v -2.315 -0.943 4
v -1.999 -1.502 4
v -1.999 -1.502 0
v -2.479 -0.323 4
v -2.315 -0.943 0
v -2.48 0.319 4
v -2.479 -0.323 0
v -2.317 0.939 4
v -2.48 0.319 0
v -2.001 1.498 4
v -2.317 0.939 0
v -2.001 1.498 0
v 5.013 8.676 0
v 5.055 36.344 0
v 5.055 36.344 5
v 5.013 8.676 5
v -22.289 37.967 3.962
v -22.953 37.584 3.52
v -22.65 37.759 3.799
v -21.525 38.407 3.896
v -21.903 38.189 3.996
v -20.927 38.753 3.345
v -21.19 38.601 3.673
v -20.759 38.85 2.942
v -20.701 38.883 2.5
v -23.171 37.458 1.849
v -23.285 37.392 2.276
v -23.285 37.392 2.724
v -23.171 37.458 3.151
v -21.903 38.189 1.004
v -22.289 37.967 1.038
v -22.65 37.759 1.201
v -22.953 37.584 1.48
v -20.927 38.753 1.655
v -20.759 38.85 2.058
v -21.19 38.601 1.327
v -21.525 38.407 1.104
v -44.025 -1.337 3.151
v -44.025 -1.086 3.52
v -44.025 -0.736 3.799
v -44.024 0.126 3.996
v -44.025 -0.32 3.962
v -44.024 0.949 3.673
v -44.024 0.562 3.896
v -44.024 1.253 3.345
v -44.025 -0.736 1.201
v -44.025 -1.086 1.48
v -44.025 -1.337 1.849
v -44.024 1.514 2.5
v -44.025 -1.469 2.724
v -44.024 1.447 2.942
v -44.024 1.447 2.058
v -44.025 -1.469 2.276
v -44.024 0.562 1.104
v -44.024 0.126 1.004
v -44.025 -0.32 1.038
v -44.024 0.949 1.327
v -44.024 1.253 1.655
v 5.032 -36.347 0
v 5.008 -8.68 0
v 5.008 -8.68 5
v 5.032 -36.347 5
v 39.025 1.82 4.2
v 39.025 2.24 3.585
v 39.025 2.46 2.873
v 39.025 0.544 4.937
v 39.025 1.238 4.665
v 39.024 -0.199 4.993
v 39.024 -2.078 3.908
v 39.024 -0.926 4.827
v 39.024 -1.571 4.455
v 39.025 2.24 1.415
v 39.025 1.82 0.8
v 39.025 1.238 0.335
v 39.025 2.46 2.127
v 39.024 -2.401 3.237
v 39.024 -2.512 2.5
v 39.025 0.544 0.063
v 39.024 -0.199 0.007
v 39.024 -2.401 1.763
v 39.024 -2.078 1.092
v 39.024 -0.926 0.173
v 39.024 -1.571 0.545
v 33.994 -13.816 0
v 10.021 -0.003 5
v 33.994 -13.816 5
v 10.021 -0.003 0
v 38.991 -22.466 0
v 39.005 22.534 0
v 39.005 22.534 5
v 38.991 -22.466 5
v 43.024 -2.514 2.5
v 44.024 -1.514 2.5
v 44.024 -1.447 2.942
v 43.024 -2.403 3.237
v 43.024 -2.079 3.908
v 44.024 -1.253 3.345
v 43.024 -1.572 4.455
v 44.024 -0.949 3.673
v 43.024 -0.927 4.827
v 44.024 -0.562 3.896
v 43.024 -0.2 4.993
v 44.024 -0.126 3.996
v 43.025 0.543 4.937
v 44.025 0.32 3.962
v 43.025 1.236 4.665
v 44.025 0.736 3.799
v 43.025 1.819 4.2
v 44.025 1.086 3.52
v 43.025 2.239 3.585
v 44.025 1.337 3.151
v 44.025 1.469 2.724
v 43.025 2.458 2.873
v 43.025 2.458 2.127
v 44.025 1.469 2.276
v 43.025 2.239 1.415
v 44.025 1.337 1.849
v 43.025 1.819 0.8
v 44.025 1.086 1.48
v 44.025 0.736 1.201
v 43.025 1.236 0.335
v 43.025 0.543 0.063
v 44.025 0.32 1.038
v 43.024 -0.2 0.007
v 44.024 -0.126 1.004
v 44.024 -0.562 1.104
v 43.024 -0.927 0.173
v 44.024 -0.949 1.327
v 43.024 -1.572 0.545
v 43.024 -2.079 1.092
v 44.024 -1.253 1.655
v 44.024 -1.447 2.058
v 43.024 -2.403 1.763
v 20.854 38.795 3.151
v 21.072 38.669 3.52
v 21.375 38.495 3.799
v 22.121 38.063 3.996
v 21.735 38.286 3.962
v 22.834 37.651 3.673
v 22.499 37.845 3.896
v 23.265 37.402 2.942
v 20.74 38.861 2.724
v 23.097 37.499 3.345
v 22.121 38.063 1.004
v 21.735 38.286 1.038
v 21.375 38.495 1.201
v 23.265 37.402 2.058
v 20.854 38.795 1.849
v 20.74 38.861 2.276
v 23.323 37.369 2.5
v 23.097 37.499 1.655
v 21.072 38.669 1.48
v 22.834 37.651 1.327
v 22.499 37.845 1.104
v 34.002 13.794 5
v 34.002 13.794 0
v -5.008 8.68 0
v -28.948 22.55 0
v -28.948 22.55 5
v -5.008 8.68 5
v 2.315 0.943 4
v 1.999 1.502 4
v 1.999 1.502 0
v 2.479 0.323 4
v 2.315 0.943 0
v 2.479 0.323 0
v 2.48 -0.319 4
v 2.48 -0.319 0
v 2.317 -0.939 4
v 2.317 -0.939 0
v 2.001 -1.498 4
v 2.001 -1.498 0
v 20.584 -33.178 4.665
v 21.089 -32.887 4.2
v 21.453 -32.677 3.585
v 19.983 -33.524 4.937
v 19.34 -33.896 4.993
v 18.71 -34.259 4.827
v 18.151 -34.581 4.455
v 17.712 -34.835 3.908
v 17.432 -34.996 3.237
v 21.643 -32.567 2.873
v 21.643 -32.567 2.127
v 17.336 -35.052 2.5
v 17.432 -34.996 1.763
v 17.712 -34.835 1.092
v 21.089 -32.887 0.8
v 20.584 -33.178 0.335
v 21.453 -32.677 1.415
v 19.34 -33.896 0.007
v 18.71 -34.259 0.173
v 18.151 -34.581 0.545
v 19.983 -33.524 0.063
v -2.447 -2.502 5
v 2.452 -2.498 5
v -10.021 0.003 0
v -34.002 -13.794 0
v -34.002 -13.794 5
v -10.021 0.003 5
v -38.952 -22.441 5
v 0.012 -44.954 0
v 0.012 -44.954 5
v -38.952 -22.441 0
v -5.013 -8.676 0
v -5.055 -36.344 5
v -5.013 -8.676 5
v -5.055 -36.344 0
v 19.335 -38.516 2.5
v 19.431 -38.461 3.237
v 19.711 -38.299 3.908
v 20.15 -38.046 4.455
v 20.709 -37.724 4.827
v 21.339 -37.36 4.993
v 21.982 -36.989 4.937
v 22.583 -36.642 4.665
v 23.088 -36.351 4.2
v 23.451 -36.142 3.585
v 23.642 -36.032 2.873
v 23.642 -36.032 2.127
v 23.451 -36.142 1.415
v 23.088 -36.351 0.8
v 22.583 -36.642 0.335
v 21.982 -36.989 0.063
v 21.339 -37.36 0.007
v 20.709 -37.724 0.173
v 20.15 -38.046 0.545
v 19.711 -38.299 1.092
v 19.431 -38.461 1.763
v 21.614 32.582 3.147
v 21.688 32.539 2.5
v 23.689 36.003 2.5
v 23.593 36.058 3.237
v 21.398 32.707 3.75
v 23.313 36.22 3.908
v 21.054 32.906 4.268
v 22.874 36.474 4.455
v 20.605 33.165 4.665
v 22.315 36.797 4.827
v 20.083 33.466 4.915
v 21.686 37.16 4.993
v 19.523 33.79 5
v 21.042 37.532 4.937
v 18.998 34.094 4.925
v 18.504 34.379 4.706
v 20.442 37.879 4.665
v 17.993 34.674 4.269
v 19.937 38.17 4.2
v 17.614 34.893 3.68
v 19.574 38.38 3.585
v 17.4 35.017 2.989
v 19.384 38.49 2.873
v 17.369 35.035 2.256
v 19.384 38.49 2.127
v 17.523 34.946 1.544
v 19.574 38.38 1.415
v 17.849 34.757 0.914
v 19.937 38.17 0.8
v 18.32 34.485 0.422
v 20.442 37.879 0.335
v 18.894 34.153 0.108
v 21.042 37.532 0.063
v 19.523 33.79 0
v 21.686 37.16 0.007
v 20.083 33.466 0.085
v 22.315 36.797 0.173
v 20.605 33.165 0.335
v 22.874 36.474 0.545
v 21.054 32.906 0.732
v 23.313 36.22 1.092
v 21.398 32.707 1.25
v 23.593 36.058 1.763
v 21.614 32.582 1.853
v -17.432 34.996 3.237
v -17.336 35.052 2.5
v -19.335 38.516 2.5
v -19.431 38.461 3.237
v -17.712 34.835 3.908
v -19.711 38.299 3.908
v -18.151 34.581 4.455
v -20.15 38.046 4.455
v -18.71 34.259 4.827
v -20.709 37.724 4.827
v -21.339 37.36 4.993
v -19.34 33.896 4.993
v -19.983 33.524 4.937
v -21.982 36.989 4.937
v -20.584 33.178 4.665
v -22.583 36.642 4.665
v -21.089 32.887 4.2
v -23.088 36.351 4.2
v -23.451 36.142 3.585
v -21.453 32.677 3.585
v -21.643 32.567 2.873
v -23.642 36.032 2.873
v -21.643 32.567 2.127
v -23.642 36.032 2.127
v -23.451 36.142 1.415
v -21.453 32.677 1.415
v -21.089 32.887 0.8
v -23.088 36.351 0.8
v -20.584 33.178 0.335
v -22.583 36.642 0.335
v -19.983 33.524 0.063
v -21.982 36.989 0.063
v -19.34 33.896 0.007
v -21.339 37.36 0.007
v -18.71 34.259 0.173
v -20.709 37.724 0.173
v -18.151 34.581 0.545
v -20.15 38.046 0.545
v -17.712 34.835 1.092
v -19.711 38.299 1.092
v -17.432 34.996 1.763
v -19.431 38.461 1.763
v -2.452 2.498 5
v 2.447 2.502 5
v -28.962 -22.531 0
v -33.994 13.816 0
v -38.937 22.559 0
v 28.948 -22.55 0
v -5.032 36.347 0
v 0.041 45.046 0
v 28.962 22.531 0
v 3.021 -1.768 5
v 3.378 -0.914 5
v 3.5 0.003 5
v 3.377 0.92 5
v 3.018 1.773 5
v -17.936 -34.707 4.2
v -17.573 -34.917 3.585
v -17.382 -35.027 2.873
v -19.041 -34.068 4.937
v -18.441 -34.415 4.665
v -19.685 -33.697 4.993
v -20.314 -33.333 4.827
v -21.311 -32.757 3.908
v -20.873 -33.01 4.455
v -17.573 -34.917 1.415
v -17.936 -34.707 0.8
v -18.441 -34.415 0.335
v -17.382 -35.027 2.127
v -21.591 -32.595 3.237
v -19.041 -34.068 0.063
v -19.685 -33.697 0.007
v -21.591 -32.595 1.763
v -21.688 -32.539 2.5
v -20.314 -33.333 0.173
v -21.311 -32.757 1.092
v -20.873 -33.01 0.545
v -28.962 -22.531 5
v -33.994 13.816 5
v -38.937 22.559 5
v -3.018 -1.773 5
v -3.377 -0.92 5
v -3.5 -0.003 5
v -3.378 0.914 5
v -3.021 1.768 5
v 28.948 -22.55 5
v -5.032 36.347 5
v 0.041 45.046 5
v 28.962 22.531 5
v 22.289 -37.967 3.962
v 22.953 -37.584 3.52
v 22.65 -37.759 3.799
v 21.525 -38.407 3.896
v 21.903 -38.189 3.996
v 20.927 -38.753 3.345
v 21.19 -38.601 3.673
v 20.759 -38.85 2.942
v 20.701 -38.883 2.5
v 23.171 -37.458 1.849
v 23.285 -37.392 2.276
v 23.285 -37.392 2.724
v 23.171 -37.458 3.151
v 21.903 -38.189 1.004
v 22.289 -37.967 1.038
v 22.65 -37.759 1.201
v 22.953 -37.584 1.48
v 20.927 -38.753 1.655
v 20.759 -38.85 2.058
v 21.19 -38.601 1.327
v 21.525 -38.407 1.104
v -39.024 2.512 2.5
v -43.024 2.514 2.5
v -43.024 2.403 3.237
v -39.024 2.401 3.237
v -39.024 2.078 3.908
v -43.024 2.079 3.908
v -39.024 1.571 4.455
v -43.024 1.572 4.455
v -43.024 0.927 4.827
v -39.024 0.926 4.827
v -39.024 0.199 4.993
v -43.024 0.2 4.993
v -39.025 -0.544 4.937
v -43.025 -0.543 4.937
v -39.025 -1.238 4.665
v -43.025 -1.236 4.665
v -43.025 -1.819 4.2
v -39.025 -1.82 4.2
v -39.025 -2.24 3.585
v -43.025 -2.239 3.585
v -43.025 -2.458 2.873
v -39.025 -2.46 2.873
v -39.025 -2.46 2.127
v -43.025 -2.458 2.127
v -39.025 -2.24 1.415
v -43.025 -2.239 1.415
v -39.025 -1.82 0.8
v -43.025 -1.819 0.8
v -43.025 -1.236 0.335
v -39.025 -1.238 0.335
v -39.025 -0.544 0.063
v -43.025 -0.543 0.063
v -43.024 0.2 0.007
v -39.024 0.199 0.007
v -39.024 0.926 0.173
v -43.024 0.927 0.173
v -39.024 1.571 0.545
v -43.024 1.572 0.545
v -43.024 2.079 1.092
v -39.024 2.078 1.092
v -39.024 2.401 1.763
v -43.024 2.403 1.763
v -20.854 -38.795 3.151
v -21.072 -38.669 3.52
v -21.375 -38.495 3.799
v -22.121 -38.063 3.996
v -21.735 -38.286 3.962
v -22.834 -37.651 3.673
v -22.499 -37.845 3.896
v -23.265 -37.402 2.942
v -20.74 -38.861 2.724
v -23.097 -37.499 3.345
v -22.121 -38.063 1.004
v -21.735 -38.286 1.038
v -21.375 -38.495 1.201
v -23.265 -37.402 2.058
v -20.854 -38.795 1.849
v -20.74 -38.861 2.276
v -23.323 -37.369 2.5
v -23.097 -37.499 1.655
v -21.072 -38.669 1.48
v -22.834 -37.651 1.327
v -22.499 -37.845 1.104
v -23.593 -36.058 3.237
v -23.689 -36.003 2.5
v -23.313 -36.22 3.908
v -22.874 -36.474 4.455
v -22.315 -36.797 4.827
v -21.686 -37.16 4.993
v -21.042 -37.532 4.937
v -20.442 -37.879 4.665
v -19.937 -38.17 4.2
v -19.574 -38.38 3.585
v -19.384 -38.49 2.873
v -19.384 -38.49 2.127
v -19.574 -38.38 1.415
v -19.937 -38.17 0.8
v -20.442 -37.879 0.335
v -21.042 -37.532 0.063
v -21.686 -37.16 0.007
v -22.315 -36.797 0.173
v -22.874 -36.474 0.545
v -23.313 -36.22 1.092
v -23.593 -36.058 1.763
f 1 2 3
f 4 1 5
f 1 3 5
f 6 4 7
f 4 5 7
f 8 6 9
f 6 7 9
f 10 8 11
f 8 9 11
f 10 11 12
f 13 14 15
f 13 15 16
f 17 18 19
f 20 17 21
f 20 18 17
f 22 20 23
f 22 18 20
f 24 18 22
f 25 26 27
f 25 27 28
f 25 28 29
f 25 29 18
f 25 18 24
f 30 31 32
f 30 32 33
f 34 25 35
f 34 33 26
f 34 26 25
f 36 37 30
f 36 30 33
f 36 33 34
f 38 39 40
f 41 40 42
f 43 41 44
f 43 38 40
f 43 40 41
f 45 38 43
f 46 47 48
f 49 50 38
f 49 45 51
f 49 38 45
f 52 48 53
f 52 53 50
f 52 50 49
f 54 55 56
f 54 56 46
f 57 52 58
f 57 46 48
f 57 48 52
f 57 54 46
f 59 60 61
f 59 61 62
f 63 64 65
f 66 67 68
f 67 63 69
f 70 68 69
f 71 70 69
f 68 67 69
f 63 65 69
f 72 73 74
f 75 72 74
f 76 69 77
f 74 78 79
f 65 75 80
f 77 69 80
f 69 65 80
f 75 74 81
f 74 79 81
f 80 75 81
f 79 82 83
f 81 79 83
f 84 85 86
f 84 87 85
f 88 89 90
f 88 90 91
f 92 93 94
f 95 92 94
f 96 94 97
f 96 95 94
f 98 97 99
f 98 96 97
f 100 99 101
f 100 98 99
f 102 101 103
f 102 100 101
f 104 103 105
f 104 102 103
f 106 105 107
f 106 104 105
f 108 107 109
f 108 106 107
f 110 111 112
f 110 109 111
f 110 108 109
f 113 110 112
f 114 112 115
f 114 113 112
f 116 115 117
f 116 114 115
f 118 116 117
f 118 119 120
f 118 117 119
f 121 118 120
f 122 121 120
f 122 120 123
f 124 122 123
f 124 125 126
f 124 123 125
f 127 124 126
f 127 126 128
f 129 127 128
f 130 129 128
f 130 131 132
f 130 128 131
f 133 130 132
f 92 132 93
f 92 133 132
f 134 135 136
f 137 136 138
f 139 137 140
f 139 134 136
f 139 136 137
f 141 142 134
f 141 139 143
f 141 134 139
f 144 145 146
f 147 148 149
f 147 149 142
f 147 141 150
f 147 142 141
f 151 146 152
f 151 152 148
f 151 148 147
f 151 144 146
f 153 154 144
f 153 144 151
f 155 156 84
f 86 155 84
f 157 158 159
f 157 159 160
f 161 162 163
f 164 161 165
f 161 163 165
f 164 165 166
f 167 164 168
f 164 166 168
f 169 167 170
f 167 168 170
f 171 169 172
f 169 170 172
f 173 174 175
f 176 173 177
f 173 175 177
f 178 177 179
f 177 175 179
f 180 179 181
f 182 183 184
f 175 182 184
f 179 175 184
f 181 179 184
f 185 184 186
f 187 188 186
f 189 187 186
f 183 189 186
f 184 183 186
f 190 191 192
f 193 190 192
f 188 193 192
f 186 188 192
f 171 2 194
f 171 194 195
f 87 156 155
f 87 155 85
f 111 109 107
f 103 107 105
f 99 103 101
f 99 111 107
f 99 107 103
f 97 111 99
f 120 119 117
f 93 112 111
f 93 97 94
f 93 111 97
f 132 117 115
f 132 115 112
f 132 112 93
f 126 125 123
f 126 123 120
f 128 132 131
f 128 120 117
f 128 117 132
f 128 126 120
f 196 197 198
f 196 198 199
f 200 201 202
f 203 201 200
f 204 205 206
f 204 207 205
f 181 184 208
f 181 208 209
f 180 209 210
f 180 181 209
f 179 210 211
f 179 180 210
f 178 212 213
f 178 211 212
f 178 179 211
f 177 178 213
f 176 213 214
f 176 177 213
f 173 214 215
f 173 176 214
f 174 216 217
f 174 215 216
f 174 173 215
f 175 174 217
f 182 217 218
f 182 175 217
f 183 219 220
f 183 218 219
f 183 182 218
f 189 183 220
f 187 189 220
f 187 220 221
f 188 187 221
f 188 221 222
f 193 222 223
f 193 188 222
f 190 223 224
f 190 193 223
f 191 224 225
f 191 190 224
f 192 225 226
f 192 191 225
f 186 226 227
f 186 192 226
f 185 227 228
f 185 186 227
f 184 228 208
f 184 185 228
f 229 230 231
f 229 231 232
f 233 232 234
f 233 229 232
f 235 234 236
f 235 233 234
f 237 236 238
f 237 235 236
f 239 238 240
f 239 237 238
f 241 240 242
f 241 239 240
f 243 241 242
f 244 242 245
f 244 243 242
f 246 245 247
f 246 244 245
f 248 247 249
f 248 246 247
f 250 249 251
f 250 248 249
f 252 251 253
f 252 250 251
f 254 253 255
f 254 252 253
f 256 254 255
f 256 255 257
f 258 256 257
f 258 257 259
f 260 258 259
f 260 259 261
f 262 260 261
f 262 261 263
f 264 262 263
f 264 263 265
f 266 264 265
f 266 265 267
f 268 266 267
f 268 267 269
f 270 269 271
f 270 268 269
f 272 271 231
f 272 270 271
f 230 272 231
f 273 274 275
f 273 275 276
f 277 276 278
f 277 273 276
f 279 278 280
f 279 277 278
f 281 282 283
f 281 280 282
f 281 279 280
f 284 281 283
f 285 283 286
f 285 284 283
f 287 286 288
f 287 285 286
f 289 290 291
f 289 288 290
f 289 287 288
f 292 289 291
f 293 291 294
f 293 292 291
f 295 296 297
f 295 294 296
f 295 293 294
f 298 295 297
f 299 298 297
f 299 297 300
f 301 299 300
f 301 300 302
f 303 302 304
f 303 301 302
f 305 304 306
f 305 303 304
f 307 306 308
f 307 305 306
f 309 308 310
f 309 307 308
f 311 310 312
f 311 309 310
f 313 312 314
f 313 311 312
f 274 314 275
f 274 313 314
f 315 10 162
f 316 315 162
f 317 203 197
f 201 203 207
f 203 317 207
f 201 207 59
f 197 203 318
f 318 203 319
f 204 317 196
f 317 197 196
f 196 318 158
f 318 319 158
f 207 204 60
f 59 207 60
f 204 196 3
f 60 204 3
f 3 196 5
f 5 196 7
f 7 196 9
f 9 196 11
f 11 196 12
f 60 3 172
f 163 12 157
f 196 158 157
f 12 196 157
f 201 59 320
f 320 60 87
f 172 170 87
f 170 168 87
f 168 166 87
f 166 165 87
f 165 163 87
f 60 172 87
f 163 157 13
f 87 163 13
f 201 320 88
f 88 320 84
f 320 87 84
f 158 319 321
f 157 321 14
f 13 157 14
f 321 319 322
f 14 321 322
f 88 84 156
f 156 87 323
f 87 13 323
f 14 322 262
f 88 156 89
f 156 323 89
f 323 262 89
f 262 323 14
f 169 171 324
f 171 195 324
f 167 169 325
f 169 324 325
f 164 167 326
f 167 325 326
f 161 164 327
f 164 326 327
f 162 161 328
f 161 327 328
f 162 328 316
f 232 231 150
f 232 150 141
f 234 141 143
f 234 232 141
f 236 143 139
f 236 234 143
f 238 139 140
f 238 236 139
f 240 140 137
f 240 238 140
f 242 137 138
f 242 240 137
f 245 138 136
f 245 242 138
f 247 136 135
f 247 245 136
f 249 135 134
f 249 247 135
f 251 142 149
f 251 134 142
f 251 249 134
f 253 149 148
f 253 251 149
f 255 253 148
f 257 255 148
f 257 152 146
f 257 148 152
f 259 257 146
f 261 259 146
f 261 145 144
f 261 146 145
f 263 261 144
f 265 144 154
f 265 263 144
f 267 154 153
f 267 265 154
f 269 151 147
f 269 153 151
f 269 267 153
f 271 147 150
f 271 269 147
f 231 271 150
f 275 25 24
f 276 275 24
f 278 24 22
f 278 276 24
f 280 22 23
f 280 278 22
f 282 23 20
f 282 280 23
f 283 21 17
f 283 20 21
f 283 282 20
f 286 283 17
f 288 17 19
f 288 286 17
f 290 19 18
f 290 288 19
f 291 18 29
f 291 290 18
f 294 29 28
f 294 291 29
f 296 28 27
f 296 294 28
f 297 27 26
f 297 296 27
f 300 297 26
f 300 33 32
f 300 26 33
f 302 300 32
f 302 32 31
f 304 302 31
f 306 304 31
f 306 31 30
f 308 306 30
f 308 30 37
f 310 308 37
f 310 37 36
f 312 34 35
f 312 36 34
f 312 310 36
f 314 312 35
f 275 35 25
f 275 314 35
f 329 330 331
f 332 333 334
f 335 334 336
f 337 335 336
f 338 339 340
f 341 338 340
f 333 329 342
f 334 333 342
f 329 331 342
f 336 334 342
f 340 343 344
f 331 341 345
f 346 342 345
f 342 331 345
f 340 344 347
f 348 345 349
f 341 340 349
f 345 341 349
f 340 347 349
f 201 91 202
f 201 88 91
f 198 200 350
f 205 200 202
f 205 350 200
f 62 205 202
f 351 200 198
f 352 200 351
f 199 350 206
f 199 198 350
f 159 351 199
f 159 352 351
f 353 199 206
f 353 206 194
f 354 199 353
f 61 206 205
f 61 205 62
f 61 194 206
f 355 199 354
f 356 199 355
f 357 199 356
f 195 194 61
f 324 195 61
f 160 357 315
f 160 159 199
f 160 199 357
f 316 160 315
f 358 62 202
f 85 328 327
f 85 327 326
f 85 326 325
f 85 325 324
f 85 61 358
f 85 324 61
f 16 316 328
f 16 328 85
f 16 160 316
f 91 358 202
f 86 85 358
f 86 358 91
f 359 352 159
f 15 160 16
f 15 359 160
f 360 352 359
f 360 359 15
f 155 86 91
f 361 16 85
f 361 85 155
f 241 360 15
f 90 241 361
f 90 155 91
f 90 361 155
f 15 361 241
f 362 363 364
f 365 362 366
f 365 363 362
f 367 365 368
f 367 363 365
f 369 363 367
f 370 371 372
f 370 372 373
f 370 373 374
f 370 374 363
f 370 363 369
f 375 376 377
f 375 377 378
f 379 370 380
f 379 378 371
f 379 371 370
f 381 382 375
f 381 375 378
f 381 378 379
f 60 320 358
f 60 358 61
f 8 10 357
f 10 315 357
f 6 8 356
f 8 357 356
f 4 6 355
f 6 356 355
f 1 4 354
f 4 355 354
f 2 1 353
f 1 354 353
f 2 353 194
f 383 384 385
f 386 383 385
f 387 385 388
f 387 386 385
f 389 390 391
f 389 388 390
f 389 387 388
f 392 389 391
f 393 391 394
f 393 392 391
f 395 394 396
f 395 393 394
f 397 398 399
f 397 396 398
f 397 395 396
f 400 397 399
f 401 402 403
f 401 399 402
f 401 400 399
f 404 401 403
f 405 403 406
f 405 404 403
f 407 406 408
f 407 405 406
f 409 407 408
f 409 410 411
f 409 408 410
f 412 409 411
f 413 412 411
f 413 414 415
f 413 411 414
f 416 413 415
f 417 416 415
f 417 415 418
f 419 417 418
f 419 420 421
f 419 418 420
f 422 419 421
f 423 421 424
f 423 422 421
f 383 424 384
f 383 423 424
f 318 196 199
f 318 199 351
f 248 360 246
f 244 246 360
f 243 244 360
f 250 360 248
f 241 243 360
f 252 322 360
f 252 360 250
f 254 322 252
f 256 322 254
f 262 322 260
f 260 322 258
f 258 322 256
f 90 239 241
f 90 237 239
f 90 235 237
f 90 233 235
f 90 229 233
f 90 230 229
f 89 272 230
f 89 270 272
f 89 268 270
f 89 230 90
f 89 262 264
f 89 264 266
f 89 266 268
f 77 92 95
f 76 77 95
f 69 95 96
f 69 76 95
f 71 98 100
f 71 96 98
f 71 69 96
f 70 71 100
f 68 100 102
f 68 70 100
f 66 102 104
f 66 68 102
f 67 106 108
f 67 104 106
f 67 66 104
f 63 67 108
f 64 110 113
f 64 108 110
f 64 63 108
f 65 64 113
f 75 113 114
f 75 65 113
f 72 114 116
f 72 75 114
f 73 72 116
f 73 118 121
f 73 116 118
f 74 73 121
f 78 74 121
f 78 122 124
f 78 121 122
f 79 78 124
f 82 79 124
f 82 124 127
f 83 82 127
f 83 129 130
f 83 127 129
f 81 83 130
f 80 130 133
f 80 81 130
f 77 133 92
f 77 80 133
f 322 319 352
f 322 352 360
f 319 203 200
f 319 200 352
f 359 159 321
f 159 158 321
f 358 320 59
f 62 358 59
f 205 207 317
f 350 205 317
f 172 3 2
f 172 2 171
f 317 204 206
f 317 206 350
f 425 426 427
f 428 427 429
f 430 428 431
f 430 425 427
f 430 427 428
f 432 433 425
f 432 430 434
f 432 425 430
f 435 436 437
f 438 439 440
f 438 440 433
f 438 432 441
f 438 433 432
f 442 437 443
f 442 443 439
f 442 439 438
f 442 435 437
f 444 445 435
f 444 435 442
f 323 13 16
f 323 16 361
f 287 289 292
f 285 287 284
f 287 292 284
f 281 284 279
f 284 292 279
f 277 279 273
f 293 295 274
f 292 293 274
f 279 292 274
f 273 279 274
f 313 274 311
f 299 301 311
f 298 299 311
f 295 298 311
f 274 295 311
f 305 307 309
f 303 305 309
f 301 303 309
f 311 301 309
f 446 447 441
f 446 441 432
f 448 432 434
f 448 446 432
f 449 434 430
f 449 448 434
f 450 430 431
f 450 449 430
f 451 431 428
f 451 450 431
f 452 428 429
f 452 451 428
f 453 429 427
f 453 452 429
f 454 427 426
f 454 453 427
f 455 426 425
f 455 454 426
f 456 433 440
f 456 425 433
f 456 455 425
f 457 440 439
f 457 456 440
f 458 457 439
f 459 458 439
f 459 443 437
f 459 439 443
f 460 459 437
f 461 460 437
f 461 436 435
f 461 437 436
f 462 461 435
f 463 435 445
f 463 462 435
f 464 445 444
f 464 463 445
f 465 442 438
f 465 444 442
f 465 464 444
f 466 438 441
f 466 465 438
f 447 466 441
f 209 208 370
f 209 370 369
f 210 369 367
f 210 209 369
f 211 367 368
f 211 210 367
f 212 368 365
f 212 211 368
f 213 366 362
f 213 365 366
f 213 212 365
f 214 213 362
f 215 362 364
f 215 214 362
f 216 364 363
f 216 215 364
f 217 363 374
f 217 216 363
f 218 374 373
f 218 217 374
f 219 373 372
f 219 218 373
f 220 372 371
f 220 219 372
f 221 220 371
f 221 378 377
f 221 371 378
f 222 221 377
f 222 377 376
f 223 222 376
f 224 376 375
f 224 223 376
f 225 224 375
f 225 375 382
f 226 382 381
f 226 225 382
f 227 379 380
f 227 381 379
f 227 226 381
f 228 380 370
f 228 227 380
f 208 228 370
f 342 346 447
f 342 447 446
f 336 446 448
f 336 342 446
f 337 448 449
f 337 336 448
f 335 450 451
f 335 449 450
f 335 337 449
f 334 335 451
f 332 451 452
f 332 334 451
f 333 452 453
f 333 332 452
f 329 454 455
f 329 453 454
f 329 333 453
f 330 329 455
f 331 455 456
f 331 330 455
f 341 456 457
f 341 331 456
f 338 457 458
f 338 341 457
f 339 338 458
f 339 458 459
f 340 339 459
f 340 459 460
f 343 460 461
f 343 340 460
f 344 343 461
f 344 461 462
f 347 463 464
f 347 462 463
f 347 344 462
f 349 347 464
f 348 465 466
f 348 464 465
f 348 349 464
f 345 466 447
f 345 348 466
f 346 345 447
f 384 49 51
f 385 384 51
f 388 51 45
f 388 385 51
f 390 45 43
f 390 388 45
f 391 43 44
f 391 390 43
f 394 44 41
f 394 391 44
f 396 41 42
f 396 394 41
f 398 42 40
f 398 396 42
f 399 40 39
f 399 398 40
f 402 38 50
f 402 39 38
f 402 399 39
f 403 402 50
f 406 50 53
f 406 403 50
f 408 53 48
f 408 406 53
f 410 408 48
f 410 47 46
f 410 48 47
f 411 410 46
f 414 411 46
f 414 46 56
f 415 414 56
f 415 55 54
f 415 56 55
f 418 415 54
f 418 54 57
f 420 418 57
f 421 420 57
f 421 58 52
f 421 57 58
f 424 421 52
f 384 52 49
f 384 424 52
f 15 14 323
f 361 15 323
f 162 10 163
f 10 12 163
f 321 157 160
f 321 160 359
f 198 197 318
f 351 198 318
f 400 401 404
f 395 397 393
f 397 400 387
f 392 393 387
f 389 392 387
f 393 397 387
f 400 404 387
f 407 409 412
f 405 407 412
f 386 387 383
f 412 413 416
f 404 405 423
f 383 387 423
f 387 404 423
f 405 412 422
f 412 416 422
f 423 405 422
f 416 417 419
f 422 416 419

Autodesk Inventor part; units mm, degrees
ref_plane "YZ Plane" through (0, 0, 0) normal (1, 0, 0) x (0, 1, 0)
ref_plane "XZ Plane" through (0, 0, 0) normal (0, 1, 0) x (-1, 0, 0)
ref_plane "XY Plane" through (0, 0, 0) normal (0, 0, 1) x (1, 0, 0)
sketch "스케치1" plane through (0, 0, 0) normal (0, 0, 1) x (1, 0, 0)
  line L0 (0.041, 45.0463) -> (39.005, 22.534)
  line L1 (39.005, 22.534) -> (38.9908, -22.466)
  line L2 (38.9908, -22.466) -> (0.0125, -44.9537)
  line L3 (0.0125, -44.9537) -> (-38.9515, -22.4414)
  line L4 (-38.9515, -22.4414) -> (-38.9373, 22.5586)
  line L5 (-38.9373, 22.5586) -> (0.041, 45.0463)
  line L6 (-38.9373, 22.5586) -> (0, 0)
  line L7 (0, 0) -> (-0.0392, 45.0926)
  line L8 (-5.0075, 8.6797) -> (-5.0316, 36.3473)
  line L9 (0.0143, -39.1802) -> (0.0341, -39.1916)
  line L10 (-28.9475, 22.5495) -> (-5.0075, 8.6797)
  line L11 (-28.9475, 22.5495) -> (-5.0316, 36.3473)
  line L12 (-0.0341, 39.2305) -> (0.0392, 39.2728)
  line L13 (5.0131, 8.6765) -> (28.9619, 22.5311)
  line L14 (5.0547, 36.3441) -> (28.9619, 22.5311)
  line L15 (5.0547, 36.3441) -> (5.0131, 8.6765)
  line L16 (10.0206, -0.0032) -> (33.9935, -13.8162)
  line L17 (34.0023, 13.7945) -> (33.9935, -13.8162)
  line L18 (34.0023, 13.7945) -> (10.0206, -0.0032)
  line L19 (5.0075, -8.6797) -> (5.0316, -36.3473)
  line L20 (28.9475, -22.5495) -> (5.0316, -36.3473)
  line L21 (28.9475, -22.5495) -> (5.0075, -8.6797)
  line L22 (-5.0131, -8.6765) -> (-28.9619, -22.5311)
  line L23 (-5.0547, -36.3441) -> (-28.9619, -22.5311)
  line L24 (-5.0547, -36.3441) -> (-5.0131, -8.6765)
  line L25 (-10.0206, 0.0032) -> (-33.9935, 13.8162)
  line L26 (-34.0023, -13.7945) -> (-33.9935, 13.8162)
  line L27 (-34.0023, -13.7945) -> (-10.0206, 0.0032)
  circle A0 centre (0, 0) radius 2.5
  line L28 (-2.0013, 1.4983) -> (1.9987, 1.5017)
  line L29 (-1.9987, -1.5017) -> (2.0013, -1.4983)
  dimension "d19" = 45
  dimension "d20" = 5
  dimension "d22" = 5
  dimension "d23" = 5
  dimension "d26" = 360
  dimension "d28" = 5
  dimension "d29" = 1.5
  dimension "d30" = 1.5
extrude "돌출1" add sketch "스케치1" along normal blind 5 contours L0 L1 L2 L3 L4 L6 A0 L7 L5 | L7 A0 L6 L5 | A0 L28 L7 | L7 L28 A0 | L29 A0
sketch "스케치2" plane through (0.041, 45.0463, 5) normal (0.5003, 0.8659, 0) x (0.8659, -0.5003, 0)
  line L0 (45, 5) -> (0, 5) construction
  circle A0 centre (22.5, 2.5) radius 2.5
  point P0 (22.5, 5)
  point P1 (22.5, 5)
  dimension "d31" = 5
  dimension "d32" = 0
extrude "돌출2" add sketch "스케치2" along normal blind 5
chamfer "모따기1" distance 1 angle 45 1 edges at (19.8597, 39.3701, 2.5)
pattern_circular "원형 패턴1" count 6 over 360 about axis through (0, 0, -10) along (0, 0, 1) of "돌출2", "모따기1"
chamfer "모따기2" distance 1 angle 45 4 edges at (0.0013, -1.5, 5) (-2.5, -0.0022, 5) (-0.0013, 1.5, 5) (2.5, 0.0022, 5)
properties part number "inner_case_bottom"
